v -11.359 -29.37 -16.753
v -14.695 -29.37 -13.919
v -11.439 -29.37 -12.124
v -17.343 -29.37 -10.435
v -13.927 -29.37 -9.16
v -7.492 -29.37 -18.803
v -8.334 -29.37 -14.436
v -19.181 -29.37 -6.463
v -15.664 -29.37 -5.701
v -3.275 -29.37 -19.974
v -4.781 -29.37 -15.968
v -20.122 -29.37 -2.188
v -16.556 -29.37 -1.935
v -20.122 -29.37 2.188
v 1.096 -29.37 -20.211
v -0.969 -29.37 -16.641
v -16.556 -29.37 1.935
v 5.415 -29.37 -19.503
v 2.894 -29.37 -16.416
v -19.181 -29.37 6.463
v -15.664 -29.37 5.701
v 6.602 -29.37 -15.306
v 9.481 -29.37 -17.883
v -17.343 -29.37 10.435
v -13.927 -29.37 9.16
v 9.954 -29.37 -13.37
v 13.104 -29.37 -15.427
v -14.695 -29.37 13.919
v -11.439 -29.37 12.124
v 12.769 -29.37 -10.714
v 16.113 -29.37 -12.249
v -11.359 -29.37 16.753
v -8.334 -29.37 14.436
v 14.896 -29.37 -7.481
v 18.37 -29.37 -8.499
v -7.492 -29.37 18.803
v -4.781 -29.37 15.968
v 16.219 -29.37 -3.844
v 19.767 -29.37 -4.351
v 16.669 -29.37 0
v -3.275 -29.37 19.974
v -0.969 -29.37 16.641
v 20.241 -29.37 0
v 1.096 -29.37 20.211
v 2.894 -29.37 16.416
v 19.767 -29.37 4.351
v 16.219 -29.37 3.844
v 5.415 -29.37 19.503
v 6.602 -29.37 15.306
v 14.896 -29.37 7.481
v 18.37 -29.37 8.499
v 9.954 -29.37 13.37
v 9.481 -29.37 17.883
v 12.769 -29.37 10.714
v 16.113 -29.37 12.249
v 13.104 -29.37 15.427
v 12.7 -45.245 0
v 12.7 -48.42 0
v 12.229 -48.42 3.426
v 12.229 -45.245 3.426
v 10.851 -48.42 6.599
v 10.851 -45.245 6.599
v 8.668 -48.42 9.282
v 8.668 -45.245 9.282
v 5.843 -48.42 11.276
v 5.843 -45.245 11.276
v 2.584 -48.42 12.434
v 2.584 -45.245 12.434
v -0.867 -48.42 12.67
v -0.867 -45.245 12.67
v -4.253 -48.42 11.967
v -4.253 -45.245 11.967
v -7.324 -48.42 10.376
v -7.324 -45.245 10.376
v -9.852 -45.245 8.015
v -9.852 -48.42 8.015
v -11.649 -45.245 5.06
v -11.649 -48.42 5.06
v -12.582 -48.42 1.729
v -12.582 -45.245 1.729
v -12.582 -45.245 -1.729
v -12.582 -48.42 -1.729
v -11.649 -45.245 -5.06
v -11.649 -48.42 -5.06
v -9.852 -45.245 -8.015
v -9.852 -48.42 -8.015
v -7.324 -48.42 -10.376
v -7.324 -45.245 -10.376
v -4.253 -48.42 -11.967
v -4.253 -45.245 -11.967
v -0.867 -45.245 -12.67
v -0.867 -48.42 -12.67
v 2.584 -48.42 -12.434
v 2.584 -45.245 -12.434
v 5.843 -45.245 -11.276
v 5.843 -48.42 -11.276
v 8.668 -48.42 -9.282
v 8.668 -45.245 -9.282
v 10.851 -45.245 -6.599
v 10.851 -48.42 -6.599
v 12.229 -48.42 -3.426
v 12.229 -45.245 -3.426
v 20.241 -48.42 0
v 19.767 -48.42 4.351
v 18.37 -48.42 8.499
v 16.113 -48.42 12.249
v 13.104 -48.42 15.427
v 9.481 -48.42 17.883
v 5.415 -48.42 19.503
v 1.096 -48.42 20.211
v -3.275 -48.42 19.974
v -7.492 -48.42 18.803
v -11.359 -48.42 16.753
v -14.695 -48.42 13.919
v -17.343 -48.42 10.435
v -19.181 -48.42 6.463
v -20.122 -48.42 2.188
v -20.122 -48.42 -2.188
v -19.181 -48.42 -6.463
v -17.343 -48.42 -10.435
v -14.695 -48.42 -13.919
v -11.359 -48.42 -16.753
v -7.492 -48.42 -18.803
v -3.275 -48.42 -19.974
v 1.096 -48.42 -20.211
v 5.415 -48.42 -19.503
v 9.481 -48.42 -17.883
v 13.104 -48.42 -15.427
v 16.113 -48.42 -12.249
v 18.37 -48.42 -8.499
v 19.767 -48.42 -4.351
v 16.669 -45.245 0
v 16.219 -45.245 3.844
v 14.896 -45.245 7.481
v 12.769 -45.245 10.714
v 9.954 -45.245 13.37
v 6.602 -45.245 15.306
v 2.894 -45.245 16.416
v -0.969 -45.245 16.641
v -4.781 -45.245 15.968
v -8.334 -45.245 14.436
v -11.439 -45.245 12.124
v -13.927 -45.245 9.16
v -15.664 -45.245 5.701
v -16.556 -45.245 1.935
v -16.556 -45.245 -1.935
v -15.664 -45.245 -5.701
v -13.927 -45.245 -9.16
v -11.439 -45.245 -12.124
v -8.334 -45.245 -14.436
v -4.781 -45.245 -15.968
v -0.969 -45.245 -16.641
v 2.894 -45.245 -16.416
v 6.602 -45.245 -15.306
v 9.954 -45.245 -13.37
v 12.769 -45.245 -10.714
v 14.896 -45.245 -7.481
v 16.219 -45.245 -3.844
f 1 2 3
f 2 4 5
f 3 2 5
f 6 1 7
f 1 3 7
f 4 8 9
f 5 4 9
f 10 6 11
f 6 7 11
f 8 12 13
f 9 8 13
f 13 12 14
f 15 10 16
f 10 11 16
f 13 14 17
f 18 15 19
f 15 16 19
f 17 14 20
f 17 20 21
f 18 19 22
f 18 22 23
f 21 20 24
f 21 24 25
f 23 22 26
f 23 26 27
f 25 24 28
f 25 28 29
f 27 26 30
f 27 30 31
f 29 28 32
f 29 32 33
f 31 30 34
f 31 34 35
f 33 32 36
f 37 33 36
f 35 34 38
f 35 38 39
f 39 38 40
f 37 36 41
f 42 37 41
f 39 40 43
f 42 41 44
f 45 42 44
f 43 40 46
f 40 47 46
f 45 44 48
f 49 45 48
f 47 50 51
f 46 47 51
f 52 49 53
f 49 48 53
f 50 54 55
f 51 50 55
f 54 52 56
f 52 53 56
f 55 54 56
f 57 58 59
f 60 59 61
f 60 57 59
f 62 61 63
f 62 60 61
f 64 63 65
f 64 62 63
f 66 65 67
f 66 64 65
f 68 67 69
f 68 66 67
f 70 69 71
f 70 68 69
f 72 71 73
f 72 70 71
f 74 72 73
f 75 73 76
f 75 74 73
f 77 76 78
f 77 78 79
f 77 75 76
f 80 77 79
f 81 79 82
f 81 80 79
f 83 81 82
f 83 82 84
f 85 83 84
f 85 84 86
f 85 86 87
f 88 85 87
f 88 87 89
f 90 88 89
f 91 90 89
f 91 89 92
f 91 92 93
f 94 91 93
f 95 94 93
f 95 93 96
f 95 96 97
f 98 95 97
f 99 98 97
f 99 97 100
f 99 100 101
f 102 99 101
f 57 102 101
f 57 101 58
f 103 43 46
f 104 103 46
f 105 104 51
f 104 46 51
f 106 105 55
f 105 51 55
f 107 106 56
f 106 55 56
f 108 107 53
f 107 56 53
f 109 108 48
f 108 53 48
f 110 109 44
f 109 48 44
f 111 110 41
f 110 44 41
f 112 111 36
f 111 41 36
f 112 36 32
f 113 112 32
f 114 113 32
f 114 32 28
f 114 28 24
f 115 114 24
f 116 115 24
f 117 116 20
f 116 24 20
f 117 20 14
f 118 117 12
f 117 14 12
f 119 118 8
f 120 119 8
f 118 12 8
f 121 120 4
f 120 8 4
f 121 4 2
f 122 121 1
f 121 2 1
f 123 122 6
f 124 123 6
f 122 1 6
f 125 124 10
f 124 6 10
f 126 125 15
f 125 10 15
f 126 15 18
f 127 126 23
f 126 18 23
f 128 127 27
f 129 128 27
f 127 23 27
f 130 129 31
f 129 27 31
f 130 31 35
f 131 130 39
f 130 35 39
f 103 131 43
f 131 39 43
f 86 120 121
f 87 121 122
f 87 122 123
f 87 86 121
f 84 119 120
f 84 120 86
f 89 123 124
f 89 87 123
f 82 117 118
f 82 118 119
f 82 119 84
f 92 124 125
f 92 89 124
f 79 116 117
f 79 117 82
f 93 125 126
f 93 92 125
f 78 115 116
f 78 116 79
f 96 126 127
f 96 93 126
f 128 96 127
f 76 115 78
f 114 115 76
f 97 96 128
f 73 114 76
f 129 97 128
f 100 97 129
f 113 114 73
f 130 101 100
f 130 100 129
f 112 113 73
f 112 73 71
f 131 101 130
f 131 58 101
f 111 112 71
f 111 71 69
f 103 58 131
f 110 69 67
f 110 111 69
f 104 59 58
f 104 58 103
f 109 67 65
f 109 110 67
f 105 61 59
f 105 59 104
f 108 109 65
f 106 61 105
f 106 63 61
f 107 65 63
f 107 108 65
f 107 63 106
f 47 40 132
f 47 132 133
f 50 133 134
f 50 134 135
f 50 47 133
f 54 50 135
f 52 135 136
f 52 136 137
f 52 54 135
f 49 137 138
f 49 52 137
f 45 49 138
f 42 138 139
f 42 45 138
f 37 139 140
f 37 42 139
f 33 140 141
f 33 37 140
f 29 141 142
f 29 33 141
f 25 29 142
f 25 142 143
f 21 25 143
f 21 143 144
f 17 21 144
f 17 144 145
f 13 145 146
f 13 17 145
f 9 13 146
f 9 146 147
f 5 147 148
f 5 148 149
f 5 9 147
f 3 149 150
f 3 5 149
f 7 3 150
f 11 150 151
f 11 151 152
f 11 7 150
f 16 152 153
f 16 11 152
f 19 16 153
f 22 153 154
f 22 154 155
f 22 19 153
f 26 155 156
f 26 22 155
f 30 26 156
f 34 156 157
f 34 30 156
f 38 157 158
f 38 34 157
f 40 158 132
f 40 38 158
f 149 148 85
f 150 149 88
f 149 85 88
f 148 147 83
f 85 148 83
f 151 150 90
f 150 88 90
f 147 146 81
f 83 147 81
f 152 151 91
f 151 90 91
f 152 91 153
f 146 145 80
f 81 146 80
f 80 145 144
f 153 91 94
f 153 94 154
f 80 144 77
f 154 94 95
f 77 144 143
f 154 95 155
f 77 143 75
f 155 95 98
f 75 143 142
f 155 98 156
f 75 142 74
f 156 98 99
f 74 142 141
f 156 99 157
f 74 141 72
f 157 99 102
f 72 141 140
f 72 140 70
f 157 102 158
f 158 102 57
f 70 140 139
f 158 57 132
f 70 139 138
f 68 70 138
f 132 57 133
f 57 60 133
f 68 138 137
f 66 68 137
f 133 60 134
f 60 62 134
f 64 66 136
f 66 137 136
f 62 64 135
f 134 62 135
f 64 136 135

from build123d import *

# Parameters (mm, degrees)
SKETCH019_R   = 16.66875
PAD019_DEPTH  = 15.875
SKETCH018_R   = 20.240625
SKETCH018_R_2 = 12.7
PAD018_DEPTH  = 19.05


with BuildPart() as body019:
    # Sketch019 → Pad019 (new body)
    with BuildSketch(Plane.XZ):
        Circle(SKETCH019_R)
    extrude(amount=PAD019_DEPTH)


with BuildPart() as cut012:
    # Sketch018 → Pad018 (new body)
    with BuildSketch(Plane.XZ):
        Circle(SKETCH018_R)
        Circle(SKETCH018_R_2, mode=Mode.SUBTRACT)
    extrude(amount=PAD018_DEPTH)

    # Cut012: cut Body019
    add(body019.part, mode=Mode.SUBTRACT)


with BuildPart() as cut012_1:
    # Cut012 placement: moved
    add(cut012.part.moved(Location((0, -29.37, 0))))


solid = cut012_1.part
